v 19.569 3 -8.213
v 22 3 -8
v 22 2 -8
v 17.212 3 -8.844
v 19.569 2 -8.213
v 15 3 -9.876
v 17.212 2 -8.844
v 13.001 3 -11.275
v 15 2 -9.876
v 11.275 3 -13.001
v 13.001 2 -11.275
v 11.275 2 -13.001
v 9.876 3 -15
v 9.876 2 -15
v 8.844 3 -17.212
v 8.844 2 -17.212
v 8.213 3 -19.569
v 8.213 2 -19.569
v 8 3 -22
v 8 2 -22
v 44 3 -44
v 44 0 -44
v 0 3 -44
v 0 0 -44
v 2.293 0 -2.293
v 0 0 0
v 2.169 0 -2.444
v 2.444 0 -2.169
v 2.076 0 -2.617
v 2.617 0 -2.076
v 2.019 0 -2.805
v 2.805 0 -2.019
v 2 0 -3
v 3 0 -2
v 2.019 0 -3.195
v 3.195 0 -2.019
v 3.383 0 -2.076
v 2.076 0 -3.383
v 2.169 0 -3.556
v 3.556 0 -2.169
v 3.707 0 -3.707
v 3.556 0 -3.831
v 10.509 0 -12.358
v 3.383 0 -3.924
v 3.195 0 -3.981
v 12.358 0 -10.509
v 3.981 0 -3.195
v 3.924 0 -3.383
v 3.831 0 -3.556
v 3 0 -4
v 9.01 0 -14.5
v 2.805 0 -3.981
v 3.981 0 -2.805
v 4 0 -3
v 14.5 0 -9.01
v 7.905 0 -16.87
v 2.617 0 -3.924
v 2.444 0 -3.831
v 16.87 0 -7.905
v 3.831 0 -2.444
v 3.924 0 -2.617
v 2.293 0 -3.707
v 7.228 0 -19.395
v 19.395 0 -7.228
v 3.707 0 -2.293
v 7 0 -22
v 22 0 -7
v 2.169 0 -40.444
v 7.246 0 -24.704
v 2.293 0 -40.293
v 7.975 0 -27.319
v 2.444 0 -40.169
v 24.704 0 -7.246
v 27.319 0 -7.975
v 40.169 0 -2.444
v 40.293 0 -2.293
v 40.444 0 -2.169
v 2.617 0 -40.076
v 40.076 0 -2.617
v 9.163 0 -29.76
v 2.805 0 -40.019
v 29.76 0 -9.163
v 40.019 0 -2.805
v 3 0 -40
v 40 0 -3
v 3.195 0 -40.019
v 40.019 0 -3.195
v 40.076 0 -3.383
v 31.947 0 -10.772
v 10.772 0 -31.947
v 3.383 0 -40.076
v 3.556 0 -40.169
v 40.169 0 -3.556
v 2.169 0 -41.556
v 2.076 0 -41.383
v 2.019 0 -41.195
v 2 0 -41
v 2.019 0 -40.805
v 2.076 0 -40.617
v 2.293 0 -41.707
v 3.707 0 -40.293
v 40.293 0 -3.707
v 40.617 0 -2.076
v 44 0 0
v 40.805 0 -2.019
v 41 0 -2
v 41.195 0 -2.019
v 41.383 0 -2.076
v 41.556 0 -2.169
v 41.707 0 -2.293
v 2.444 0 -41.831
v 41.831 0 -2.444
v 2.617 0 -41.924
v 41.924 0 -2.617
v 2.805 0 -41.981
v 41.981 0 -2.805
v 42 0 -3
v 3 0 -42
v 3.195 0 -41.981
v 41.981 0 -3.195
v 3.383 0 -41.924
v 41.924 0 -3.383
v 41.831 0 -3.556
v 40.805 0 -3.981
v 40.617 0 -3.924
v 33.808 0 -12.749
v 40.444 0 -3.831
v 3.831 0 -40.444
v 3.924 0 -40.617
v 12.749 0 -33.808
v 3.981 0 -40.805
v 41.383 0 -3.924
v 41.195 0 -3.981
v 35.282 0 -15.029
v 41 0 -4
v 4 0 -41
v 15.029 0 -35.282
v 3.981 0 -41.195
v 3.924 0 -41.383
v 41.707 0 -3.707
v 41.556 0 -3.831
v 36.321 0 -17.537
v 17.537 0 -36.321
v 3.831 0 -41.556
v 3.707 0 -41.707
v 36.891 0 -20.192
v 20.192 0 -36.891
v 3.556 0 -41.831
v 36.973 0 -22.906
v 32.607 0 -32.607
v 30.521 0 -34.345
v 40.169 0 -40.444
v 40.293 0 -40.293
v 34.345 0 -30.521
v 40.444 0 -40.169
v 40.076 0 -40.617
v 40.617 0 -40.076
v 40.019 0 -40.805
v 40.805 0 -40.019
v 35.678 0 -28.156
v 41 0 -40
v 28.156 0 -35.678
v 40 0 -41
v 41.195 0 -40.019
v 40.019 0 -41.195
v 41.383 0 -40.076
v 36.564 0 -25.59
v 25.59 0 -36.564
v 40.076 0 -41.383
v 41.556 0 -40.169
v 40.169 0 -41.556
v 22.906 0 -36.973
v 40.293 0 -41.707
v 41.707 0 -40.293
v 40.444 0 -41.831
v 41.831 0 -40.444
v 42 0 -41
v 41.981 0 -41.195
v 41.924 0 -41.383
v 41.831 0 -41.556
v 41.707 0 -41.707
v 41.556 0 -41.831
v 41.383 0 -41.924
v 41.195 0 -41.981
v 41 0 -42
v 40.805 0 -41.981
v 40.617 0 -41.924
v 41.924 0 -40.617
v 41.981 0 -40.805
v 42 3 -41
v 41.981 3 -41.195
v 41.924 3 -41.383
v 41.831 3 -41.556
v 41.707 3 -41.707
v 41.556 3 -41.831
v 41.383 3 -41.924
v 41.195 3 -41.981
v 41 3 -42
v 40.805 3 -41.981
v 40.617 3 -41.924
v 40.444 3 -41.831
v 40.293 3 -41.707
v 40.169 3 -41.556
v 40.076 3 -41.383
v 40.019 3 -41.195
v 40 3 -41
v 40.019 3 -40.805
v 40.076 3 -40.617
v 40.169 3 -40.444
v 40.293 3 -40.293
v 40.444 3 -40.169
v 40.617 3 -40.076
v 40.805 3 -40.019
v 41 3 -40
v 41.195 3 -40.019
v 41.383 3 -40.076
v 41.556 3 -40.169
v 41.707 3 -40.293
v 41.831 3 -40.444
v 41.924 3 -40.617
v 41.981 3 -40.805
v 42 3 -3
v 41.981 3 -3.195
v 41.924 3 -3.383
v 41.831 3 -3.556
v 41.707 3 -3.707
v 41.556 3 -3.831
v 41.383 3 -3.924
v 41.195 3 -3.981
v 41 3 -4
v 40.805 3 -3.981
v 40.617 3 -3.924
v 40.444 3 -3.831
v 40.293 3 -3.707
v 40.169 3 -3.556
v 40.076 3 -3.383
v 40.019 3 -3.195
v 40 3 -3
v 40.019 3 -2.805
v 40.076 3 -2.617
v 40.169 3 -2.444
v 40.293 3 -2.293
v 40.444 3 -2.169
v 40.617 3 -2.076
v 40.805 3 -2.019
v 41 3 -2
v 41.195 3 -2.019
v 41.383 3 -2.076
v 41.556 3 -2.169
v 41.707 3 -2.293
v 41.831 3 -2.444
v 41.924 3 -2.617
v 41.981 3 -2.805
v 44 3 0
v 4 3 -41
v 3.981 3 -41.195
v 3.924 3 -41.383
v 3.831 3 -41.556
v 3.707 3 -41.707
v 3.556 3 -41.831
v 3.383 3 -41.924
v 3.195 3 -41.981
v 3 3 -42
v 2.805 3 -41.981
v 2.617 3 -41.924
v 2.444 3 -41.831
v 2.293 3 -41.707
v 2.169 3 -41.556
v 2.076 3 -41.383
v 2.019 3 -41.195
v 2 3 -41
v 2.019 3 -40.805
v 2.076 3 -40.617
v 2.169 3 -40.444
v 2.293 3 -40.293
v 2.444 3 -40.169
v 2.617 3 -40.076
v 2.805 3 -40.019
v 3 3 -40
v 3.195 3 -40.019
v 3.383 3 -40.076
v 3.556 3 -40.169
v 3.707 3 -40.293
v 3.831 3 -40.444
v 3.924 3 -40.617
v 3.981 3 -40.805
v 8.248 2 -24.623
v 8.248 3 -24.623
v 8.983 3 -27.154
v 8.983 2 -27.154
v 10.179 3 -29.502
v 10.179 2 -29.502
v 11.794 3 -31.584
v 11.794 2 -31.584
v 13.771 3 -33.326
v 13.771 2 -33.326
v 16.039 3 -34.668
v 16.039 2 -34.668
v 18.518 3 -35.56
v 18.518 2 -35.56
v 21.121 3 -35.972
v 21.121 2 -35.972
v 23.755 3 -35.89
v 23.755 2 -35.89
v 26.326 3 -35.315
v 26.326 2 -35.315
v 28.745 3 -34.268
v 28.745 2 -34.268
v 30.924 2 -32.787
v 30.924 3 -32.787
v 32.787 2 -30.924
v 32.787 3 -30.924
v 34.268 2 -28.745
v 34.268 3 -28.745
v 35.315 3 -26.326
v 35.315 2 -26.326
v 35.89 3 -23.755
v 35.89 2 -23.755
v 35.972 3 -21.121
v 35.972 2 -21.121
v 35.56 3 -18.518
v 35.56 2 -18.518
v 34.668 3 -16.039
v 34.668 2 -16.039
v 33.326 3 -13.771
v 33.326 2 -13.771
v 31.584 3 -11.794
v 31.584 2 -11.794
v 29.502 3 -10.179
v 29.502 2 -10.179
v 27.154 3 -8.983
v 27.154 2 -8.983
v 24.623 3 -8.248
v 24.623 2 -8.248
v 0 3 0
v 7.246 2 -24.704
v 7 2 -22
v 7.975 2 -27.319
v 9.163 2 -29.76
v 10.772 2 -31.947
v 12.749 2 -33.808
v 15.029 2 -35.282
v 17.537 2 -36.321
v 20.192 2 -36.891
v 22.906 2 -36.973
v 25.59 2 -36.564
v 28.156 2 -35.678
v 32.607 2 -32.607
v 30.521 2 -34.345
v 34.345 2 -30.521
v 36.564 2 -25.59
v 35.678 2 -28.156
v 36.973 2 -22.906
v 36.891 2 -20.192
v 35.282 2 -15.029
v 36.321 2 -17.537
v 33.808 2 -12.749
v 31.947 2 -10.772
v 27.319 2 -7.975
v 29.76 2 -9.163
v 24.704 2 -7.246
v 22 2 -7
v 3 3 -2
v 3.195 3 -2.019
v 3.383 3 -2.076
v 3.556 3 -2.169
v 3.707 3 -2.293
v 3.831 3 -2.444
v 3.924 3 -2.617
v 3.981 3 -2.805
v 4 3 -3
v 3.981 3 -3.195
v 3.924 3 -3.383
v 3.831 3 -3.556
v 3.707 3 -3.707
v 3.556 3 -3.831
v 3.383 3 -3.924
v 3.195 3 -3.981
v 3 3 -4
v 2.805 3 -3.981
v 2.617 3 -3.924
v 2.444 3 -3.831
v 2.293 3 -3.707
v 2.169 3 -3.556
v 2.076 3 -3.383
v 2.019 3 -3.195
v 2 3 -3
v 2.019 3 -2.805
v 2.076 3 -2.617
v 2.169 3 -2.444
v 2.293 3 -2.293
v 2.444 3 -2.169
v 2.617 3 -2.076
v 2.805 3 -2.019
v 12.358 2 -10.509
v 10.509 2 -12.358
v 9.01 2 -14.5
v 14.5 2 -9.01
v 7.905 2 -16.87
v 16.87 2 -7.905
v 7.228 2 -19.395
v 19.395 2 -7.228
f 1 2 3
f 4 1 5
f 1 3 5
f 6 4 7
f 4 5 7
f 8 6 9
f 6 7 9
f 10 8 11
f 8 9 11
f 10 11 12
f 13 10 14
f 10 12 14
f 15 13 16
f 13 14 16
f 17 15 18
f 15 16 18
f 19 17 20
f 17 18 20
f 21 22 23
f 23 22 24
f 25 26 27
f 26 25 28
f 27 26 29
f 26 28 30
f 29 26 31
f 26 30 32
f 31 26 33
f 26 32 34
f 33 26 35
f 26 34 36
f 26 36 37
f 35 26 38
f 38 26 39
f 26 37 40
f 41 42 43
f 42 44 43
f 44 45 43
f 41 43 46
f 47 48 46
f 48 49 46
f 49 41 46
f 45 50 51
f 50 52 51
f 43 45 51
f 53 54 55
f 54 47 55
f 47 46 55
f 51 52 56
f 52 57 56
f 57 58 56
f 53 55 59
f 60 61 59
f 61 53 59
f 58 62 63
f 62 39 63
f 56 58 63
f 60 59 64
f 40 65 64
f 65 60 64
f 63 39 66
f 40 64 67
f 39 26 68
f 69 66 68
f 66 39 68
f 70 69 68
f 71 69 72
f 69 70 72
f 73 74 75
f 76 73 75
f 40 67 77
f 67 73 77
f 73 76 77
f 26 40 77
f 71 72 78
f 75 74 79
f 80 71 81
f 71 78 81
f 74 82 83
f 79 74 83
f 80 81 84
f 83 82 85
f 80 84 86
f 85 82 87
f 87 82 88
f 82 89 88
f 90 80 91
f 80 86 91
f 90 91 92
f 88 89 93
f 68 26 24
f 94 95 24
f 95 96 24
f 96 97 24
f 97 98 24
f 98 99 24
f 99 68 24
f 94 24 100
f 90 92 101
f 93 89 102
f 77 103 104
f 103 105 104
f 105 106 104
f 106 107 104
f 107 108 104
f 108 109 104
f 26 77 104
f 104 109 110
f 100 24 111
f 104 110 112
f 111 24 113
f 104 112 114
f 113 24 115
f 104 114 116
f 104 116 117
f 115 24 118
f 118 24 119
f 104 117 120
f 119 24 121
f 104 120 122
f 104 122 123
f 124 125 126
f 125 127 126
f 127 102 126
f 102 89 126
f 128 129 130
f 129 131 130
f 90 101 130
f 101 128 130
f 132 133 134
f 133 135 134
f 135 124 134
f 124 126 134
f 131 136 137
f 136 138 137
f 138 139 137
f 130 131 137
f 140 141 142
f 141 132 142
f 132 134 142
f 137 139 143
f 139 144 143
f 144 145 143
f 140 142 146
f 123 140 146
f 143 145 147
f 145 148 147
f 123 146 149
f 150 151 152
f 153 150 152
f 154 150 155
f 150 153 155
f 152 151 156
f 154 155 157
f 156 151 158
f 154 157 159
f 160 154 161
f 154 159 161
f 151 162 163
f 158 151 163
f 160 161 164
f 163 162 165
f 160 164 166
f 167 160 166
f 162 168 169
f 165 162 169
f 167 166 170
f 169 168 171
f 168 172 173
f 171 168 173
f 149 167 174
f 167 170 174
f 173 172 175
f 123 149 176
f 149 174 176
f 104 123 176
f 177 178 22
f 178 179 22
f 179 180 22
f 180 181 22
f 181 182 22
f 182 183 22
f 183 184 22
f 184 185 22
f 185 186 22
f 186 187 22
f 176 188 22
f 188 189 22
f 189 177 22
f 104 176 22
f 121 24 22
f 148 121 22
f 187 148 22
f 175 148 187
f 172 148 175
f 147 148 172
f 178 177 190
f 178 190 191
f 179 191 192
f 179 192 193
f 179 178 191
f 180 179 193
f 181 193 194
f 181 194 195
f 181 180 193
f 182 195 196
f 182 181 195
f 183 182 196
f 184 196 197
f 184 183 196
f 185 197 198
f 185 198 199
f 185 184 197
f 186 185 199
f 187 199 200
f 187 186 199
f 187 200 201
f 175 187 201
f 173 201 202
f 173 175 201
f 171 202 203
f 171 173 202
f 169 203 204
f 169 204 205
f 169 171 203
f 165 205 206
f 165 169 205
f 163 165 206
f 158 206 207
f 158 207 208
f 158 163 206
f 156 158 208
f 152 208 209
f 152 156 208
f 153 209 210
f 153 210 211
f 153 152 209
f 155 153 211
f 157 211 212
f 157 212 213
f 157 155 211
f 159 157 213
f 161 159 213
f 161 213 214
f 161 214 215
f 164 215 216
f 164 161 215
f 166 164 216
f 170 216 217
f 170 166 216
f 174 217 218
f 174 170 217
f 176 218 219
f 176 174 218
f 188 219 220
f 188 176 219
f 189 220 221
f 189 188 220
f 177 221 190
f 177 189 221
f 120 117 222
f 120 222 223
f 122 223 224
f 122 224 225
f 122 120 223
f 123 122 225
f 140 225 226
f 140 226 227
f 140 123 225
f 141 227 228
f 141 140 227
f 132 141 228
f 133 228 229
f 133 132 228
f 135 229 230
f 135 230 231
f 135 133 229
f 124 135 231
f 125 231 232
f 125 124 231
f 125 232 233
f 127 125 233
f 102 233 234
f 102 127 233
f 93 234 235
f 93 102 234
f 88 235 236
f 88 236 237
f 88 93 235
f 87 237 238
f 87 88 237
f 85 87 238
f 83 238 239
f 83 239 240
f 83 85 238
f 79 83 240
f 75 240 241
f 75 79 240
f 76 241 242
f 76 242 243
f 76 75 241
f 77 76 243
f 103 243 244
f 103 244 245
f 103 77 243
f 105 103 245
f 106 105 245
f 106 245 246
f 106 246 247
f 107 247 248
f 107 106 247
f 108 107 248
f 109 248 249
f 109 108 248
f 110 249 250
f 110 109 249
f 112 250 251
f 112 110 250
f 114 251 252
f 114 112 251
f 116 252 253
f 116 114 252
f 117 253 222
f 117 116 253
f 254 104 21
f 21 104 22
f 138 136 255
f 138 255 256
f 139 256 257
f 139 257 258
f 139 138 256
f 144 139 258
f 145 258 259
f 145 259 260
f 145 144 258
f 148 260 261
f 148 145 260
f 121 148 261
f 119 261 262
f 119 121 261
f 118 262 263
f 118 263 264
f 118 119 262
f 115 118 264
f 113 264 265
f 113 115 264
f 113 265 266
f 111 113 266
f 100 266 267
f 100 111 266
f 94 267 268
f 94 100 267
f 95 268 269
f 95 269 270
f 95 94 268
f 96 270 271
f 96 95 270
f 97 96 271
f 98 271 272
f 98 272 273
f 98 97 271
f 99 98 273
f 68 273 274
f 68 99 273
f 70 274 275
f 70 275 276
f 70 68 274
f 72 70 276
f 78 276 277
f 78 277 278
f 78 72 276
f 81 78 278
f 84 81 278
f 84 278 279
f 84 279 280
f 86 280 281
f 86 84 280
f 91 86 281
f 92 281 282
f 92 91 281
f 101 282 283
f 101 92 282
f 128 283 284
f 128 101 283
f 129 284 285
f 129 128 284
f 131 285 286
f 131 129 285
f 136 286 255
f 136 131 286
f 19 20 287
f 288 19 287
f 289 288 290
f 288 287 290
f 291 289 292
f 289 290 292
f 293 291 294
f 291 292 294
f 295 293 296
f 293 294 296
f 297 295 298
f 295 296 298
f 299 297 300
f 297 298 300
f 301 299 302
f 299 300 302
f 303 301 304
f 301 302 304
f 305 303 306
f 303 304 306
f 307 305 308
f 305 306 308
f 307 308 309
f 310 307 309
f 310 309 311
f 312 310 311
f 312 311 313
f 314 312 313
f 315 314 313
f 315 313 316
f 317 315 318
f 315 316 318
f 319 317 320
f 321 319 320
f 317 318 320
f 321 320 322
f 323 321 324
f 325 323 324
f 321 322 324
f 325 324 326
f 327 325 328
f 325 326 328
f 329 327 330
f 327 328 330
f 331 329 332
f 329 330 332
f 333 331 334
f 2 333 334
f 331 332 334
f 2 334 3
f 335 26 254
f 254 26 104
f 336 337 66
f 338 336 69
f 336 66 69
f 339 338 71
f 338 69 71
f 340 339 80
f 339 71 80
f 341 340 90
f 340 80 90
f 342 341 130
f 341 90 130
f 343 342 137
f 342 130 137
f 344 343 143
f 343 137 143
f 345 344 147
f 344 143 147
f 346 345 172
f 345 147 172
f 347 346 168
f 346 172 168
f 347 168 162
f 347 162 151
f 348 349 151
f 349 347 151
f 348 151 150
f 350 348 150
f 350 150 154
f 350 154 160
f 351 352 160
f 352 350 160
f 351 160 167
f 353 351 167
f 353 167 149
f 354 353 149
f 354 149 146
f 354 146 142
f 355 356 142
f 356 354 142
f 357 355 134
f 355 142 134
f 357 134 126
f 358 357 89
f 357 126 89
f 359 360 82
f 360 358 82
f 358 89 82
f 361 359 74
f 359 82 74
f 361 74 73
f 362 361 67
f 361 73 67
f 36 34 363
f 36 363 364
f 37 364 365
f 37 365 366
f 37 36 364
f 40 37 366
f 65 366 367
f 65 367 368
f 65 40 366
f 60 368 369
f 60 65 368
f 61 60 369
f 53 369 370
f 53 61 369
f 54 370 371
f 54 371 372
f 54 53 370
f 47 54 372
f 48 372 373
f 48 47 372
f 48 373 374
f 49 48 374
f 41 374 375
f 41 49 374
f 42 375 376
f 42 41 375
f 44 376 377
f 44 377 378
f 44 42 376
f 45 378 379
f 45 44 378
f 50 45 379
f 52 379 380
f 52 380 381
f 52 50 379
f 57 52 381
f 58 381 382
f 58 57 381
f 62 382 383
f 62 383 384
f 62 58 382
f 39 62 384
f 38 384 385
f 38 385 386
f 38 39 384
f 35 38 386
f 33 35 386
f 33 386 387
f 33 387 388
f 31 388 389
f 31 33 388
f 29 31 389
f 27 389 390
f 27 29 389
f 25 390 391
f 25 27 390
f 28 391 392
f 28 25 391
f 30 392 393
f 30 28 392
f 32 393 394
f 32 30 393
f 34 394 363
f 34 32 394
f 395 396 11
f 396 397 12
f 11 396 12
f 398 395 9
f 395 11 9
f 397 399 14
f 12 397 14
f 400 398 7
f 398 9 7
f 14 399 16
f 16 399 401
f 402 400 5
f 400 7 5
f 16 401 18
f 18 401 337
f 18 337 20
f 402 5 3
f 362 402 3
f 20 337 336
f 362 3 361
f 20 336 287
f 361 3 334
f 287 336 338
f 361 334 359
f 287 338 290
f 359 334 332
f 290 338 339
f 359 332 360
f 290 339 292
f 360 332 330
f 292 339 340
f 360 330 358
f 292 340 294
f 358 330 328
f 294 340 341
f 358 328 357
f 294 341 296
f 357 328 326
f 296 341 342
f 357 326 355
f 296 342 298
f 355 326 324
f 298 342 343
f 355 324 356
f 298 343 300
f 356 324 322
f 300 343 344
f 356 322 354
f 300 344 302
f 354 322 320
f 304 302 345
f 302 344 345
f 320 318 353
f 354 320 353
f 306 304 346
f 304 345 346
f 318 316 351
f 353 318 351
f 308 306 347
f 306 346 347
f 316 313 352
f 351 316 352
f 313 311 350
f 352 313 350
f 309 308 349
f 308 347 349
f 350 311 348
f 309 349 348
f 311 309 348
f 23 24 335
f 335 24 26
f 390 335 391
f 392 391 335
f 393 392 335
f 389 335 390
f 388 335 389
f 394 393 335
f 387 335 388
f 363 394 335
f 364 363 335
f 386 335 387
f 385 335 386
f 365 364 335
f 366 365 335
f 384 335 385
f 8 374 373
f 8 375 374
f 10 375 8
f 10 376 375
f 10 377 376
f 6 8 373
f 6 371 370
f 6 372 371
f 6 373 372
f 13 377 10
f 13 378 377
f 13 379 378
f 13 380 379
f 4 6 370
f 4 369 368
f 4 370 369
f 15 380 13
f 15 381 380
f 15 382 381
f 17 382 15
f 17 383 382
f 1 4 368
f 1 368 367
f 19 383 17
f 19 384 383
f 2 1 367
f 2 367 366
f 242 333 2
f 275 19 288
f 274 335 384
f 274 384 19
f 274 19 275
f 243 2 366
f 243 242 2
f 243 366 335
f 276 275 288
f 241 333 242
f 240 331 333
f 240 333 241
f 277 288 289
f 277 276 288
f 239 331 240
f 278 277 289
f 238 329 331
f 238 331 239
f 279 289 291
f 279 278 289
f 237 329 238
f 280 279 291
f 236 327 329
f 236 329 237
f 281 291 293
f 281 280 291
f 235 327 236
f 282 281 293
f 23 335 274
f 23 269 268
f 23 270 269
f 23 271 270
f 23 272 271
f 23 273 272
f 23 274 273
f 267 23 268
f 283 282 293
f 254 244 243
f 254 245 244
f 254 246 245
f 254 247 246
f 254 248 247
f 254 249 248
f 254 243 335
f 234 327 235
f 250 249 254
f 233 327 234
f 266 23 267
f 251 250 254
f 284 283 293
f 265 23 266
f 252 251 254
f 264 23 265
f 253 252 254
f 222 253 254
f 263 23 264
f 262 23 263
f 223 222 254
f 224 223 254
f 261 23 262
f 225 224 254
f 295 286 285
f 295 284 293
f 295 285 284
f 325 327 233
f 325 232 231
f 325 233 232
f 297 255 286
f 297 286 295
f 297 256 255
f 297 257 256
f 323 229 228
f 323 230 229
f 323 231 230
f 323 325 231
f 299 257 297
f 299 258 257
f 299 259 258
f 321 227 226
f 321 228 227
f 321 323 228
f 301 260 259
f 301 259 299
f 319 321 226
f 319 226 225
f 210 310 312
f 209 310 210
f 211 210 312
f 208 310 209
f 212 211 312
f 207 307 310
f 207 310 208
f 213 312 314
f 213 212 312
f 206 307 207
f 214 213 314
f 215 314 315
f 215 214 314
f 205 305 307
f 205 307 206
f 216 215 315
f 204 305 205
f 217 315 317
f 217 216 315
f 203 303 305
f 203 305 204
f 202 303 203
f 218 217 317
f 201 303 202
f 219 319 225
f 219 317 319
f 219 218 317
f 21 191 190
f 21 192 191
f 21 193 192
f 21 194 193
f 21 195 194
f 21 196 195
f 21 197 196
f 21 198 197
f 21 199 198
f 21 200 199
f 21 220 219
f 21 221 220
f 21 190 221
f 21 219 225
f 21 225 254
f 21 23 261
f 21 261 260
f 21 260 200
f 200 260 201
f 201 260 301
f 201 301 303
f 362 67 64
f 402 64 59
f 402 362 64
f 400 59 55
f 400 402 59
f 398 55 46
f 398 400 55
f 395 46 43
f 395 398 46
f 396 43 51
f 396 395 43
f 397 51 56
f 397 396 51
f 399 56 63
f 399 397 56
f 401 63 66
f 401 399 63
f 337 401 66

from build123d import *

# Parameters (mm, degrees)
SKETCH1_R           = 1
BOSS_EXTRUDE1_DEPTH = 3
SKETCH3_W           = 1
SKETCH3_H           = 2
MIRROR1_OUTLINE_R   = 1
MIRROR1_DEPTH       = 3
MIRROR1_START       = 2
MIRROR1_2_DEPTH     = 1


# Read off the part's stored shape, not the designer's step: Mirror1
with BuildPart() as part:
    # Sketch1 → Boss-Extrude1 (new body)
    with BuildSketch(Plane(origin=(0, 0, 0), x_dir=(1, 0, 0), z_dir=(0, 1, 0))):
        with BuildLine():
            Line((0, 0), (22, 0))
            Line((22, 0), (22, 8))
            ThreePointArc((22, 8), (12.100505063, 12.100505063), (8, 22))
            Line((8, 22), (0, 22))
            Line((0, 22), (0, 0))
        make_face()
        with Locations(Location((3, 3, 0), (0, 0, 270))):
            Circle(SKETCH1_R, mode=Mode.SUBTRACT)
    extrude(amount=BOSS_EXTRUDE1_DEPTH)

    # Sketch3 → Cut-Revolve1 (revolve, cut)
    with BuildSketch(Plane(origin=(22, 0, 0), x_dir=(0, 0, -1), z_dir=(1, 0, 0))):
        with Locations((7.5, 1)):
            Rectangle(SKETCH3_W, SKETCH3_H)
    revolve(axis=Axis((22, 7.36812707, -22), (0, -1, 0)), mode=Mode.SUBTRACT)

    # Mirror1 outline → Mirror1 (add)
    with BuildSketch(Plane(origin=(0, 0, 0), x_dir=(1, 0, 0), z_dir=(0, 1, 0))):
        with BuildLine():
            Line((0, 44), (0, 22))
            Line((0, 22), (7, 22))
            ThreePointArc((7, 22), (32.606601718, 32.606601718), (22, 7))
            Line((22, 7), (22, 0))
            Line((22, 0), (44, 0))
            Line((44, 0), (44, 44))
            Line((44, 44), (0, 44))
        make_face()
        with Locations((41, 3)):
            Circle(MIRROR1_OUTLINE_R, mode=Mode.SUBTRACT)
        with Locations((3, 41)):
            Circle(MIRROR1_OUTLINE_R, mode=Mode.SUBTRACT)
        with Locations((41, 41)):
            Circle(MIRROR1_OUTLINE_R, mode=Mode.SUBTRACT)
    extrude(amount=MIRROR1_DEPTH)

    # Mirror1 2 outline → Mirror1 2 (add)
    with BuildSketch(Plane(origin=(0, 0, 0), x_dir=(1, 0, 0), z_dir=(0, 1, 0)).offset(MIRROR1_START)):
        with BuildLine():
            ThreePointArc((22, 7), (32.606601718, 32.606601718), (7, 22))
            Line((7, 22), (8, 22))
            ThreePointArc((8, 22), (31.899494937, 31.899494937), (22, 8))
            Line((22, 8), (22, 7))
        make_face()
    extrude(amount=MIRROR1_2_DEPTH)


solid = part.part
